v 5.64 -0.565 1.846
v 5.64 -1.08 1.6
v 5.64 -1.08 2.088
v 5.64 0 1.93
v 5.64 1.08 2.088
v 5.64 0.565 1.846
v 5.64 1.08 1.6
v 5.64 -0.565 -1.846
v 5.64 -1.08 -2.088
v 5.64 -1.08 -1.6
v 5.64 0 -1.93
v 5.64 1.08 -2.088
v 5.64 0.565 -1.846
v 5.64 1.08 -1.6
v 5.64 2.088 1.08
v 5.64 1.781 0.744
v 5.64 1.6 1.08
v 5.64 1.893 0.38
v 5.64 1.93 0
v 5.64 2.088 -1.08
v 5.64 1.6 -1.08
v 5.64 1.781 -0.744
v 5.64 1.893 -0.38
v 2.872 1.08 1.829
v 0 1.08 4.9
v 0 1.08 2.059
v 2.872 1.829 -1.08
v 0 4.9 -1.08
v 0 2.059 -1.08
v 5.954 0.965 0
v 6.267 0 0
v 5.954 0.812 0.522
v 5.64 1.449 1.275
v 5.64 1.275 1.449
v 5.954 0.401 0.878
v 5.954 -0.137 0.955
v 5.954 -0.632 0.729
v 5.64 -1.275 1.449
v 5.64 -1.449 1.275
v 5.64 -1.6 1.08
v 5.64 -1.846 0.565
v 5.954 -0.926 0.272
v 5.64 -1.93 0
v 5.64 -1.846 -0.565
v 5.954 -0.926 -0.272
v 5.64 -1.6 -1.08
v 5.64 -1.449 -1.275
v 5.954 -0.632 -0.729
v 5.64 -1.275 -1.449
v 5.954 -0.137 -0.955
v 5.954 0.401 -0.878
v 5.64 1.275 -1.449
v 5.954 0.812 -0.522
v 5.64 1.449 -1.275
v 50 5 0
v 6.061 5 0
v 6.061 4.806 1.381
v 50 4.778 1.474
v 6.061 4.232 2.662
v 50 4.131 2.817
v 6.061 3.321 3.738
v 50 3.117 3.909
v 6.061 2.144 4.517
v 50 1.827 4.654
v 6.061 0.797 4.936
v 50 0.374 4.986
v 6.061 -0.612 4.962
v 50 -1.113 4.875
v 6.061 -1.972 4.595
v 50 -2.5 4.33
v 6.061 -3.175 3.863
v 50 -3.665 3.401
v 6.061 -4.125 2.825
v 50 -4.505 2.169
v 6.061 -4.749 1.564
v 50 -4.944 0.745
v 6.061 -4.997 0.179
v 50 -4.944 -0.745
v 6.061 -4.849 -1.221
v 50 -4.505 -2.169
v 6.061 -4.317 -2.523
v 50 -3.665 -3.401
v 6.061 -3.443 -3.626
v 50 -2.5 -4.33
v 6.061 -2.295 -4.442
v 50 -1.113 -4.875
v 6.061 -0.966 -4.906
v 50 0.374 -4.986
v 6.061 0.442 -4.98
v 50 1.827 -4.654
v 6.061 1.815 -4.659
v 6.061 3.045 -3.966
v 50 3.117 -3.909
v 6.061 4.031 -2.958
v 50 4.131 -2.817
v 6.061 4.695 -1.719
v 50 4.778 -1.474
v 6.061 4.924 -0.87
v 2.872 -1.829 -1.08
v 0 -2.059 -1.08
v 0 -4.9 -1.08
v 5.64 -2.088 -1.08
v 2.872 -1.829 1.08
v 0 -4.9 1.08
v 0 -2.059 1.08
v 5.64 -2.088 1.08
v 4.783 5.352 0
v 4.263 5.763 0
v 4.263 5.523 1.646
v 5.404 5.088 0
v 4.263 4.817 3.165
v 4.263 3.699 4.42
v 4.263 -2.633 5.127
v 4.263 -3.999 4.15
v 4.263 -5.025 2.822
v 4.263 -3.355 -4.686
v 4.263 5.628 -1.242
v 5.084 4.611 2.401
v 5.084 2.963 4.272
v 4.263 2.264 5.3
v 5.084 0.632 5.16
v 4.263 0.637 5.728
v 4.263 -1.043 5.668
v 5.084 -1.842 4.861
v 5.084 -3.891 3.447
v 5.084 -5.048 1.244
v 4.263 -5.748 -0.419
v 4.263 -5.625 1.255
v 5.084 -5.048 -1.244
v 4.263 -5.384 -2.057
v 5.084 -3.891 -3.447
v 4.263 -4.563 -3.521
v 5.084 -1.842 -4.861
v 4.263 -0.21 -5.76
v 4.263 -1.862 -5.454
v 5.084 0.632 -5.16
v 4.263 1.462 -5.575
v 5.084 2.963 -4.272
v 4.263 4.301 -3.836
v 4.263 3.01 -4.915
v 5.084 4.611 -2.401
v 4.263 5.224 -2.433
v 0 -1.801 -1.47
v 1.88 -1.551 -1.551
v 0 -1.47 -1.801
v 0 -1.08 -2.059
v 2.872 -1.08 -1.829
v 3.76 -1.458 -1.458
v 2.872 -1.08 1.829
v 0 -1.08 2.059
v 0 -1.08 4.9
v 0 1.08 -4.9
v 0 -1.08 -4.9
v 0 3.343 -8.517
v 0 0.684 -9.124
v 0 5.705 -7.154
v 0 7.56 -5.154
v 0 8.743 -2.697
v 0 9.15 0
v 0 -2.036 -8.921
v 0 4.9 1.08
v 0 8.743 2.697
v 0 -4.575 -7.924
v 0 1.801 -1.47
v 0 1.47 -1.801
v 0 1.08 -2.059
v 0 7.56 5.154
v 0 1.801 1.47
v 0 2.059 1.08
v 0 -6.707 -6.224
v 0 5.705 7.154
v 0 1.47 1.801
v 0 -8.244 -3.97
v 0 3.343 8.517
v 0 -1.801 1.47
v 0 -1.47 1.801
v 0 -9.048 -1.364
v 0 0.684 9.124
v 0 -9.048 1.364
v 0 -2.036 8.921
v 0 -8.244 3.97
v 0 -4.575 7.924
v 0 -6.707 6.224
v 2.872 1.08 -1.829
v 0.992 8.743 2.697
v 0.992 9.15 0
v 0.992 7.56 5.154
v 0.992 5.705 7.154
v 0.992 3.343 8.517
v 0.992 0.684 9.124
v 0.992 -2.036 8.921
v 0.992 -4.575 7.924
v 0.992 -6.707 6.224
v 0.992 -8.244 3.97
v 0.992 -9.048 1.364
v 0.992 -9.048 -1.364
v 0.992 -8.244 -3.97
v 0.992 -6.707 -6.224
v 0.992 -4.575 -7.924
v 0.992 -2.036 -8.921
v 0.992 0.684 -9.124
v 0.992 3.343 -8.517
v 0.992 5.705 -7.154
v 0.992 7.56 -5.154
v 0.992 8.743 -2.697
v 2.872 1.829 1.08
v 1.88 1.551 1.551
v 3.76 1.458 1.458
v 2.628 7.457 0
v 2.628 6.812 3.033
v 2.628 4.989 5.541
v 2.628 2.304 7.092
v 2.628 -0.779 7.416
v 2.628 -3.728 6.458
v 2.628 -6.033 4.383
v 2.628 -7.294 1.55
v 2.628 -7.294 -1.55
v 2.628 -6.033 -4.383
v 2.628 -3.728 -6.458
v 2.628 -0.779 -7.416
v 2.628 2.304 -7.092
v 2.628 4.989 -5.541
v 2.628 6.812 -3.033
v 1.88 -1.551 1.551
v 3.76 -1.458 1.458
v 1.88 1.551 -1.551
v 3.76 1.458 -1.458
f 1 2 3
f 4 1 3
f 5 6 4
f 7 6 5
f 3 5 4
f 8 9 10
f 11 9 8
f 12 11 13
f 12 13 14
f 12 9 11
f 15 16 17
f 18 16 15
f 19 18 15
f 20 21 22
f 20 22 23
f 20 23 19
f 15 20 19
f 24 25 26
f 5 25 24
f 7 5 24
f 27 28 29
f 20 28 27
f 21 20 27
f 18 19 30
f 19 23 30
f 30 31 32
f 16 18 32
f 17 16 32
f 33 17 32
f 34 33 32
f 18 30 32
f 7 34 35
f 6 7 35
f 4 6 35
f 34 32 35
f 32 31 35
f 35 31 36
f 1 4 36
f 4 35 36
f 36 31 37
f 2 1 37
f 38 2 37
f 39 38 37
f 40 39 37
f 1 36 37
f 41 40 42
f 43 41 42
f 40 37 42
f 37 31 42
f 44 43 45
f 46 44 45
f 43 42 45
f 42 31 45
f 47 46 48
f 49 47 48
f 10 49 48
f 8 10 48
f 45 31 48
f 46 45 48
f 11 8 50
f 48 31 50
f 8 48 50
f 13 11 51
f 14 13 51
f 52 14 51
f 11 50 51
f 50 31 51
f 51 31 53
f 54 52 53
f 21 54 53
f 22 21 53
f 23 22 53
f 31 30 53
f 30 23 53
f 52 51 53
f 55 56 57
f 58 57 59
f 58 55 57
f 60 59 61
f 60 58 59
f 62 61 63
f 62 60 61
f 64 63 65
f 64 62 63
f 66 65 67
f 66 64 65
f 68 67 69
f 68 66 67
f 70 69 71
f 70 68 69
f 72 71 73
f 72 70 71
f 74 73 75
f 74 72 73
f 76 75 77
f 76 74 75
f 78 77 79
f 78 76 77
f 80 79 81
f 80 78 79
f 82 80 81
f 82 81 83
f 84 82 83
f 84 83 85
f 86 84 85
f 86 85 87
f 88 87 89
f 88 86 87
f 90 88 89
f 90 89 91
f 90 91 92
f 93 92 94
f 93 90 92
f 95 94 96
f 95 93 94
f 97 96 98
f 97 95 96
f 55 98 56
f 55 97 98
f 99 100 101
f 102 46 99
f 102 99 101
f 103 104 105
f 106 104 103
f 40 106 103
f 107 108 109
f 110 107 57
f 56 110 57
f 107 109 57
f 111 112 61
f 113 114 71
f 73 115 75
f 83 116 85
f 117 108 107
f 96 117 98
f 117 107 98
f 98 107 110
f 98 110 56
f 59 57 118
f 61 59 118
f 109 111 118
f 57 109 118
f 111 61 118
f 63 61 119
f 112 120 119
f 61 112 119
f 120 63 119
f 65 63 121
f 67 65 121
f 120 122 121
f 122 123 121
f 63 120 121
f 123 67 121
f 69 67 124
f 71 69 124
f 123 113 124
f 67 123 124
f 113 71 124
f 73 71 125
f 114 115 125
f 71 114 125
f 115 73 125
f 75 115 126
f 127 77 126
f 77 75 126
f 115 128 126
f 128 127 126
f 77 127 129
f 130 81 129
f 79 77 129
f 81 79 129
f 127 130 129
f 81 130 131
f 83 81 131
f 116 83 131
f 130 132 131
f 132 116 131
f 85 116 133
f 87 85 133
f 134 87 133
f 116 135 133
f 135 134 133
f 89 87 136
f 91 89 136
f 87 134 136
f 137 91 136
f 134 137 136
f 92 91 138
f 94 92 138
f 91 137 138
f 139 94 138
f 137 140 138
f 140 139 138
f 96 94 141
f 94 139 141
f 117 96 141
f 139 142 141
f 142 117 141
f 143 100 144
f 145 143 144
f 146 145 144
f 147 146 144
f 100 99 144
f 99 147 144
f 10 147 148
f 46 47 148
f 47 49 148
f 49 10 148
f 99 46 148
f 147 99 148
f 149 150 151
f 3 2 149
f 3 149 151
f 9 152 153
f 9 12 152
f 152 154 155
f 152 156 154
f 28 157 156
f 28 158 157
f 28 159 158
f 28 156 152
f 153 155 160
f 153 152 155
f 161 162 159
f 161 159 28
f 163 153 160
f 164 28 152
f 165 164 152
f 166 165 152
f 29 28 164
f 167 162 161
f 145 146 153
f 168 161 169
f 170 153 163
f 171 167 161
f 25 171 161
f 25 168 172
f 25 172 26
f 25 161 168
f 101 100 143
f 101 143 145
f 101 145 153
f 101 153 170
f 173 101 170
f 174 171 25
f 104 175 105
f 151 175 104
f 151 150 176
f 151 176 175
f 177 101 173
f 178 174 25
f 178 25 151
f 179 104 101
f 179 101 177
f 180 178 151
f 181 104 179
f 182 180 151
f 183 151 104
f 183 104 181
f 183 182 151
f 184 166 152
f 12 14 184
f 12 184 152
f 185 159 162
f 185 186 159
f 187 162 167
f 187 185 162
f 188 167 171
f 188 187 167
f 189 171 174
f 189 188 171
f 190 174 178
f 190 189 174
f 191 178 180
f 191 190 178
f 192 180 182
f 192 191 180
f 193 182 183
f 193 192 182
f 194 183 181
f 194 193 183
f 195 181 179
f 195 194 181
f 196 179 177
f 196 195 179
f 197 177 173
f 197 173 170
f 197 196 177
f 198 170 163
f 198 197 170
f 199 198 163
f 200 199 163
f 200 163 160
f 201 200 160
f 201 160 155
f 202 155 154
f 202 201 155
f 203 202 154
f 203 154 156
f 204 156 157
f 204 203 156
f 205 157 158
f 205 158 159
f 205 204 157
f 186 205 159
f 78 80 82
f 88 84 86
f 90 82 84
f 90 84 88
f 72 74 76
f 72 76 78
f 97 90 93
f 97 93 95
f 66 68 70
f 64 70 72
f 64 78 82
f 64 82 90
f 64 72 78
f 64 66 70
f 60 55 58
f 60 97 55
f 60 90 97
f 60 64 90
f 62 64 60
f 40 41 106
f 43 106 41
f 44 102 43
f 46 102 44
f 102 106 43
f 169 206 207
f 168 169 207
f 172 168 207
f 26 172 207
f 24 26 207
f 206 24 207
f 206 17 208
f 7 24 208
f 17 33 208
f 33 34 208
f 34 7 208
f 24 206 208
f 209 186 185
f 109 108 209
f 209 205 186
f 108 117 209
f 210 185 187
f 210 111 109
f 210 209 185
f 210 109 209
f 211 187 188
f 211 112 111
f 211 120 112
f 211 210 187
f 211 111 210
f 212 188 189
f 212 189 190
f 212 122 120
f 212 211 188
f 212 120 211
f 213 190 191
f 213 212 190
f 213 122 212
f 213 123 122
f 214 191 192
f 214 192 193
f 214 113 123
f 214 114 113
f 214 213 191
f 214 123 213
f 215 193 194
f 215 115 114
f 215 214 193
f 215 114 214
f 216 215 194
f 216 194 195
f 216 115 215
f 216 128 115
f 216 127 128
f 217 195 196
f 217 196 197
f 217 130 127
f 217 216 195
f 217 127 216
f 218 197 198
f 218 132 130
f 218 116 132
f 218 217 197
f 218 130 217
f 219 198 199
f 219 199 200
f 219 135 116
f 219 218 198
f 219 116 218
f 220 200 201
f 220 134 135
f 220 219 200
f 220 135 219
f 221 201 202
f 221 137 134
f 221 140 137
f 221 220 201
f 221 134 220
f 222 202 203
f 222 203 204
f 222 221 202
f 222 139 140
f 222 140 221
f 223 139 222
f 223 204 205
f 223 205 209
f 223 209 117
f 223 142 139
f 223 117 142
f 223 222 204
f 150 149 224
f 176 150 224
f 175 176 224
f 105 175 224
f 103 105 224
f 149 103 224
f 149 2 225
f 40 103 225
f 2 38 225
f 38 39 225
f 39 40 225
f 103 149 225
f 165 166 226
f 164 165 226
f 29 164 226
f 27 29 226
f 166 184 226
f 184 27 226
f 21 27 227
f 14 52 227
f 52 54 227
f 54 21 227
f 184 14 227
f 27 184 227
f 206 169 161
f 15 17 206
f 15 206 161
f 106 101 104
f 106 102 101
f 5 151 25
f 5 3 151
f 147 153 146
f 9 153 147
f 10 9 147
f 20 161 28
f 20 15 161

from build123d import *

# Parameters (mm, degrees)
FILLET1_R    = 2.5
SKETCH3_W    = 2.16
SKETCH3_H    = 9.8
SKETCH4_W    = 2.16
SKETCH4_H    = 4.176000402
RECPAT_COUNT = 2
RECPAT_ANGLE = 90


with BuildPart() as part:
    # BodySke → Base-Revolve (revolve)
    with BuildSketch(Plane.XY):
        Polygon((0, 0), (0, 9.15), (0.992391585, 9.15), (5, 5), (50, 5), (50, 0), align=None)
    revolve(axis=Axis((-6.35, 0, 0), (1, 0, 0)))

    # Fillet1
    fillet1_edges = [part.edges().sort_by_distance(p)[0] for p in [
        (5, -5, 0),
    ]]
    fillet(fillet1_edges, radius=FILLET1_R)

    # Sketch3 → Recess section 0
    with BuildSketch(Plane.ZY):
        Rectangle(SKETCH3_W, SKETCH3_H)
    # Sketch4 → Recess section 1
    with BuildSketch(Plane.ZY.offset(-5.64)):
        Rectangle(SKETCH4_W, SKETCH4_H)
    recess = loft(mode=Mode.SUBTRACT)

    # RecPat: Recess ×2 about axis
    recpat_axis = Axis((0, 0, 0), (1, 0, 0))
    for i in range(1, RECPAT_COUNT):
        add(recess.rotate(recpat_axis, i * RECPAT_ANGLE / (RECPAT_COUNT - 1)), mode=Mode.SUBTRACT)

    # RecCorSke → RecessCore (revolve, cut)
    with BuildSketch(Plane.XY):
        Polygon((0, 0), (0, 2.324887219), (5.64, 1.9305), (6.267257474, 0), align=None)
    revolve(axis=Axis((-3.175, 0, 0), (1, 0, 0)), mode=Mode.SUBTRACT)


solid = part.part
